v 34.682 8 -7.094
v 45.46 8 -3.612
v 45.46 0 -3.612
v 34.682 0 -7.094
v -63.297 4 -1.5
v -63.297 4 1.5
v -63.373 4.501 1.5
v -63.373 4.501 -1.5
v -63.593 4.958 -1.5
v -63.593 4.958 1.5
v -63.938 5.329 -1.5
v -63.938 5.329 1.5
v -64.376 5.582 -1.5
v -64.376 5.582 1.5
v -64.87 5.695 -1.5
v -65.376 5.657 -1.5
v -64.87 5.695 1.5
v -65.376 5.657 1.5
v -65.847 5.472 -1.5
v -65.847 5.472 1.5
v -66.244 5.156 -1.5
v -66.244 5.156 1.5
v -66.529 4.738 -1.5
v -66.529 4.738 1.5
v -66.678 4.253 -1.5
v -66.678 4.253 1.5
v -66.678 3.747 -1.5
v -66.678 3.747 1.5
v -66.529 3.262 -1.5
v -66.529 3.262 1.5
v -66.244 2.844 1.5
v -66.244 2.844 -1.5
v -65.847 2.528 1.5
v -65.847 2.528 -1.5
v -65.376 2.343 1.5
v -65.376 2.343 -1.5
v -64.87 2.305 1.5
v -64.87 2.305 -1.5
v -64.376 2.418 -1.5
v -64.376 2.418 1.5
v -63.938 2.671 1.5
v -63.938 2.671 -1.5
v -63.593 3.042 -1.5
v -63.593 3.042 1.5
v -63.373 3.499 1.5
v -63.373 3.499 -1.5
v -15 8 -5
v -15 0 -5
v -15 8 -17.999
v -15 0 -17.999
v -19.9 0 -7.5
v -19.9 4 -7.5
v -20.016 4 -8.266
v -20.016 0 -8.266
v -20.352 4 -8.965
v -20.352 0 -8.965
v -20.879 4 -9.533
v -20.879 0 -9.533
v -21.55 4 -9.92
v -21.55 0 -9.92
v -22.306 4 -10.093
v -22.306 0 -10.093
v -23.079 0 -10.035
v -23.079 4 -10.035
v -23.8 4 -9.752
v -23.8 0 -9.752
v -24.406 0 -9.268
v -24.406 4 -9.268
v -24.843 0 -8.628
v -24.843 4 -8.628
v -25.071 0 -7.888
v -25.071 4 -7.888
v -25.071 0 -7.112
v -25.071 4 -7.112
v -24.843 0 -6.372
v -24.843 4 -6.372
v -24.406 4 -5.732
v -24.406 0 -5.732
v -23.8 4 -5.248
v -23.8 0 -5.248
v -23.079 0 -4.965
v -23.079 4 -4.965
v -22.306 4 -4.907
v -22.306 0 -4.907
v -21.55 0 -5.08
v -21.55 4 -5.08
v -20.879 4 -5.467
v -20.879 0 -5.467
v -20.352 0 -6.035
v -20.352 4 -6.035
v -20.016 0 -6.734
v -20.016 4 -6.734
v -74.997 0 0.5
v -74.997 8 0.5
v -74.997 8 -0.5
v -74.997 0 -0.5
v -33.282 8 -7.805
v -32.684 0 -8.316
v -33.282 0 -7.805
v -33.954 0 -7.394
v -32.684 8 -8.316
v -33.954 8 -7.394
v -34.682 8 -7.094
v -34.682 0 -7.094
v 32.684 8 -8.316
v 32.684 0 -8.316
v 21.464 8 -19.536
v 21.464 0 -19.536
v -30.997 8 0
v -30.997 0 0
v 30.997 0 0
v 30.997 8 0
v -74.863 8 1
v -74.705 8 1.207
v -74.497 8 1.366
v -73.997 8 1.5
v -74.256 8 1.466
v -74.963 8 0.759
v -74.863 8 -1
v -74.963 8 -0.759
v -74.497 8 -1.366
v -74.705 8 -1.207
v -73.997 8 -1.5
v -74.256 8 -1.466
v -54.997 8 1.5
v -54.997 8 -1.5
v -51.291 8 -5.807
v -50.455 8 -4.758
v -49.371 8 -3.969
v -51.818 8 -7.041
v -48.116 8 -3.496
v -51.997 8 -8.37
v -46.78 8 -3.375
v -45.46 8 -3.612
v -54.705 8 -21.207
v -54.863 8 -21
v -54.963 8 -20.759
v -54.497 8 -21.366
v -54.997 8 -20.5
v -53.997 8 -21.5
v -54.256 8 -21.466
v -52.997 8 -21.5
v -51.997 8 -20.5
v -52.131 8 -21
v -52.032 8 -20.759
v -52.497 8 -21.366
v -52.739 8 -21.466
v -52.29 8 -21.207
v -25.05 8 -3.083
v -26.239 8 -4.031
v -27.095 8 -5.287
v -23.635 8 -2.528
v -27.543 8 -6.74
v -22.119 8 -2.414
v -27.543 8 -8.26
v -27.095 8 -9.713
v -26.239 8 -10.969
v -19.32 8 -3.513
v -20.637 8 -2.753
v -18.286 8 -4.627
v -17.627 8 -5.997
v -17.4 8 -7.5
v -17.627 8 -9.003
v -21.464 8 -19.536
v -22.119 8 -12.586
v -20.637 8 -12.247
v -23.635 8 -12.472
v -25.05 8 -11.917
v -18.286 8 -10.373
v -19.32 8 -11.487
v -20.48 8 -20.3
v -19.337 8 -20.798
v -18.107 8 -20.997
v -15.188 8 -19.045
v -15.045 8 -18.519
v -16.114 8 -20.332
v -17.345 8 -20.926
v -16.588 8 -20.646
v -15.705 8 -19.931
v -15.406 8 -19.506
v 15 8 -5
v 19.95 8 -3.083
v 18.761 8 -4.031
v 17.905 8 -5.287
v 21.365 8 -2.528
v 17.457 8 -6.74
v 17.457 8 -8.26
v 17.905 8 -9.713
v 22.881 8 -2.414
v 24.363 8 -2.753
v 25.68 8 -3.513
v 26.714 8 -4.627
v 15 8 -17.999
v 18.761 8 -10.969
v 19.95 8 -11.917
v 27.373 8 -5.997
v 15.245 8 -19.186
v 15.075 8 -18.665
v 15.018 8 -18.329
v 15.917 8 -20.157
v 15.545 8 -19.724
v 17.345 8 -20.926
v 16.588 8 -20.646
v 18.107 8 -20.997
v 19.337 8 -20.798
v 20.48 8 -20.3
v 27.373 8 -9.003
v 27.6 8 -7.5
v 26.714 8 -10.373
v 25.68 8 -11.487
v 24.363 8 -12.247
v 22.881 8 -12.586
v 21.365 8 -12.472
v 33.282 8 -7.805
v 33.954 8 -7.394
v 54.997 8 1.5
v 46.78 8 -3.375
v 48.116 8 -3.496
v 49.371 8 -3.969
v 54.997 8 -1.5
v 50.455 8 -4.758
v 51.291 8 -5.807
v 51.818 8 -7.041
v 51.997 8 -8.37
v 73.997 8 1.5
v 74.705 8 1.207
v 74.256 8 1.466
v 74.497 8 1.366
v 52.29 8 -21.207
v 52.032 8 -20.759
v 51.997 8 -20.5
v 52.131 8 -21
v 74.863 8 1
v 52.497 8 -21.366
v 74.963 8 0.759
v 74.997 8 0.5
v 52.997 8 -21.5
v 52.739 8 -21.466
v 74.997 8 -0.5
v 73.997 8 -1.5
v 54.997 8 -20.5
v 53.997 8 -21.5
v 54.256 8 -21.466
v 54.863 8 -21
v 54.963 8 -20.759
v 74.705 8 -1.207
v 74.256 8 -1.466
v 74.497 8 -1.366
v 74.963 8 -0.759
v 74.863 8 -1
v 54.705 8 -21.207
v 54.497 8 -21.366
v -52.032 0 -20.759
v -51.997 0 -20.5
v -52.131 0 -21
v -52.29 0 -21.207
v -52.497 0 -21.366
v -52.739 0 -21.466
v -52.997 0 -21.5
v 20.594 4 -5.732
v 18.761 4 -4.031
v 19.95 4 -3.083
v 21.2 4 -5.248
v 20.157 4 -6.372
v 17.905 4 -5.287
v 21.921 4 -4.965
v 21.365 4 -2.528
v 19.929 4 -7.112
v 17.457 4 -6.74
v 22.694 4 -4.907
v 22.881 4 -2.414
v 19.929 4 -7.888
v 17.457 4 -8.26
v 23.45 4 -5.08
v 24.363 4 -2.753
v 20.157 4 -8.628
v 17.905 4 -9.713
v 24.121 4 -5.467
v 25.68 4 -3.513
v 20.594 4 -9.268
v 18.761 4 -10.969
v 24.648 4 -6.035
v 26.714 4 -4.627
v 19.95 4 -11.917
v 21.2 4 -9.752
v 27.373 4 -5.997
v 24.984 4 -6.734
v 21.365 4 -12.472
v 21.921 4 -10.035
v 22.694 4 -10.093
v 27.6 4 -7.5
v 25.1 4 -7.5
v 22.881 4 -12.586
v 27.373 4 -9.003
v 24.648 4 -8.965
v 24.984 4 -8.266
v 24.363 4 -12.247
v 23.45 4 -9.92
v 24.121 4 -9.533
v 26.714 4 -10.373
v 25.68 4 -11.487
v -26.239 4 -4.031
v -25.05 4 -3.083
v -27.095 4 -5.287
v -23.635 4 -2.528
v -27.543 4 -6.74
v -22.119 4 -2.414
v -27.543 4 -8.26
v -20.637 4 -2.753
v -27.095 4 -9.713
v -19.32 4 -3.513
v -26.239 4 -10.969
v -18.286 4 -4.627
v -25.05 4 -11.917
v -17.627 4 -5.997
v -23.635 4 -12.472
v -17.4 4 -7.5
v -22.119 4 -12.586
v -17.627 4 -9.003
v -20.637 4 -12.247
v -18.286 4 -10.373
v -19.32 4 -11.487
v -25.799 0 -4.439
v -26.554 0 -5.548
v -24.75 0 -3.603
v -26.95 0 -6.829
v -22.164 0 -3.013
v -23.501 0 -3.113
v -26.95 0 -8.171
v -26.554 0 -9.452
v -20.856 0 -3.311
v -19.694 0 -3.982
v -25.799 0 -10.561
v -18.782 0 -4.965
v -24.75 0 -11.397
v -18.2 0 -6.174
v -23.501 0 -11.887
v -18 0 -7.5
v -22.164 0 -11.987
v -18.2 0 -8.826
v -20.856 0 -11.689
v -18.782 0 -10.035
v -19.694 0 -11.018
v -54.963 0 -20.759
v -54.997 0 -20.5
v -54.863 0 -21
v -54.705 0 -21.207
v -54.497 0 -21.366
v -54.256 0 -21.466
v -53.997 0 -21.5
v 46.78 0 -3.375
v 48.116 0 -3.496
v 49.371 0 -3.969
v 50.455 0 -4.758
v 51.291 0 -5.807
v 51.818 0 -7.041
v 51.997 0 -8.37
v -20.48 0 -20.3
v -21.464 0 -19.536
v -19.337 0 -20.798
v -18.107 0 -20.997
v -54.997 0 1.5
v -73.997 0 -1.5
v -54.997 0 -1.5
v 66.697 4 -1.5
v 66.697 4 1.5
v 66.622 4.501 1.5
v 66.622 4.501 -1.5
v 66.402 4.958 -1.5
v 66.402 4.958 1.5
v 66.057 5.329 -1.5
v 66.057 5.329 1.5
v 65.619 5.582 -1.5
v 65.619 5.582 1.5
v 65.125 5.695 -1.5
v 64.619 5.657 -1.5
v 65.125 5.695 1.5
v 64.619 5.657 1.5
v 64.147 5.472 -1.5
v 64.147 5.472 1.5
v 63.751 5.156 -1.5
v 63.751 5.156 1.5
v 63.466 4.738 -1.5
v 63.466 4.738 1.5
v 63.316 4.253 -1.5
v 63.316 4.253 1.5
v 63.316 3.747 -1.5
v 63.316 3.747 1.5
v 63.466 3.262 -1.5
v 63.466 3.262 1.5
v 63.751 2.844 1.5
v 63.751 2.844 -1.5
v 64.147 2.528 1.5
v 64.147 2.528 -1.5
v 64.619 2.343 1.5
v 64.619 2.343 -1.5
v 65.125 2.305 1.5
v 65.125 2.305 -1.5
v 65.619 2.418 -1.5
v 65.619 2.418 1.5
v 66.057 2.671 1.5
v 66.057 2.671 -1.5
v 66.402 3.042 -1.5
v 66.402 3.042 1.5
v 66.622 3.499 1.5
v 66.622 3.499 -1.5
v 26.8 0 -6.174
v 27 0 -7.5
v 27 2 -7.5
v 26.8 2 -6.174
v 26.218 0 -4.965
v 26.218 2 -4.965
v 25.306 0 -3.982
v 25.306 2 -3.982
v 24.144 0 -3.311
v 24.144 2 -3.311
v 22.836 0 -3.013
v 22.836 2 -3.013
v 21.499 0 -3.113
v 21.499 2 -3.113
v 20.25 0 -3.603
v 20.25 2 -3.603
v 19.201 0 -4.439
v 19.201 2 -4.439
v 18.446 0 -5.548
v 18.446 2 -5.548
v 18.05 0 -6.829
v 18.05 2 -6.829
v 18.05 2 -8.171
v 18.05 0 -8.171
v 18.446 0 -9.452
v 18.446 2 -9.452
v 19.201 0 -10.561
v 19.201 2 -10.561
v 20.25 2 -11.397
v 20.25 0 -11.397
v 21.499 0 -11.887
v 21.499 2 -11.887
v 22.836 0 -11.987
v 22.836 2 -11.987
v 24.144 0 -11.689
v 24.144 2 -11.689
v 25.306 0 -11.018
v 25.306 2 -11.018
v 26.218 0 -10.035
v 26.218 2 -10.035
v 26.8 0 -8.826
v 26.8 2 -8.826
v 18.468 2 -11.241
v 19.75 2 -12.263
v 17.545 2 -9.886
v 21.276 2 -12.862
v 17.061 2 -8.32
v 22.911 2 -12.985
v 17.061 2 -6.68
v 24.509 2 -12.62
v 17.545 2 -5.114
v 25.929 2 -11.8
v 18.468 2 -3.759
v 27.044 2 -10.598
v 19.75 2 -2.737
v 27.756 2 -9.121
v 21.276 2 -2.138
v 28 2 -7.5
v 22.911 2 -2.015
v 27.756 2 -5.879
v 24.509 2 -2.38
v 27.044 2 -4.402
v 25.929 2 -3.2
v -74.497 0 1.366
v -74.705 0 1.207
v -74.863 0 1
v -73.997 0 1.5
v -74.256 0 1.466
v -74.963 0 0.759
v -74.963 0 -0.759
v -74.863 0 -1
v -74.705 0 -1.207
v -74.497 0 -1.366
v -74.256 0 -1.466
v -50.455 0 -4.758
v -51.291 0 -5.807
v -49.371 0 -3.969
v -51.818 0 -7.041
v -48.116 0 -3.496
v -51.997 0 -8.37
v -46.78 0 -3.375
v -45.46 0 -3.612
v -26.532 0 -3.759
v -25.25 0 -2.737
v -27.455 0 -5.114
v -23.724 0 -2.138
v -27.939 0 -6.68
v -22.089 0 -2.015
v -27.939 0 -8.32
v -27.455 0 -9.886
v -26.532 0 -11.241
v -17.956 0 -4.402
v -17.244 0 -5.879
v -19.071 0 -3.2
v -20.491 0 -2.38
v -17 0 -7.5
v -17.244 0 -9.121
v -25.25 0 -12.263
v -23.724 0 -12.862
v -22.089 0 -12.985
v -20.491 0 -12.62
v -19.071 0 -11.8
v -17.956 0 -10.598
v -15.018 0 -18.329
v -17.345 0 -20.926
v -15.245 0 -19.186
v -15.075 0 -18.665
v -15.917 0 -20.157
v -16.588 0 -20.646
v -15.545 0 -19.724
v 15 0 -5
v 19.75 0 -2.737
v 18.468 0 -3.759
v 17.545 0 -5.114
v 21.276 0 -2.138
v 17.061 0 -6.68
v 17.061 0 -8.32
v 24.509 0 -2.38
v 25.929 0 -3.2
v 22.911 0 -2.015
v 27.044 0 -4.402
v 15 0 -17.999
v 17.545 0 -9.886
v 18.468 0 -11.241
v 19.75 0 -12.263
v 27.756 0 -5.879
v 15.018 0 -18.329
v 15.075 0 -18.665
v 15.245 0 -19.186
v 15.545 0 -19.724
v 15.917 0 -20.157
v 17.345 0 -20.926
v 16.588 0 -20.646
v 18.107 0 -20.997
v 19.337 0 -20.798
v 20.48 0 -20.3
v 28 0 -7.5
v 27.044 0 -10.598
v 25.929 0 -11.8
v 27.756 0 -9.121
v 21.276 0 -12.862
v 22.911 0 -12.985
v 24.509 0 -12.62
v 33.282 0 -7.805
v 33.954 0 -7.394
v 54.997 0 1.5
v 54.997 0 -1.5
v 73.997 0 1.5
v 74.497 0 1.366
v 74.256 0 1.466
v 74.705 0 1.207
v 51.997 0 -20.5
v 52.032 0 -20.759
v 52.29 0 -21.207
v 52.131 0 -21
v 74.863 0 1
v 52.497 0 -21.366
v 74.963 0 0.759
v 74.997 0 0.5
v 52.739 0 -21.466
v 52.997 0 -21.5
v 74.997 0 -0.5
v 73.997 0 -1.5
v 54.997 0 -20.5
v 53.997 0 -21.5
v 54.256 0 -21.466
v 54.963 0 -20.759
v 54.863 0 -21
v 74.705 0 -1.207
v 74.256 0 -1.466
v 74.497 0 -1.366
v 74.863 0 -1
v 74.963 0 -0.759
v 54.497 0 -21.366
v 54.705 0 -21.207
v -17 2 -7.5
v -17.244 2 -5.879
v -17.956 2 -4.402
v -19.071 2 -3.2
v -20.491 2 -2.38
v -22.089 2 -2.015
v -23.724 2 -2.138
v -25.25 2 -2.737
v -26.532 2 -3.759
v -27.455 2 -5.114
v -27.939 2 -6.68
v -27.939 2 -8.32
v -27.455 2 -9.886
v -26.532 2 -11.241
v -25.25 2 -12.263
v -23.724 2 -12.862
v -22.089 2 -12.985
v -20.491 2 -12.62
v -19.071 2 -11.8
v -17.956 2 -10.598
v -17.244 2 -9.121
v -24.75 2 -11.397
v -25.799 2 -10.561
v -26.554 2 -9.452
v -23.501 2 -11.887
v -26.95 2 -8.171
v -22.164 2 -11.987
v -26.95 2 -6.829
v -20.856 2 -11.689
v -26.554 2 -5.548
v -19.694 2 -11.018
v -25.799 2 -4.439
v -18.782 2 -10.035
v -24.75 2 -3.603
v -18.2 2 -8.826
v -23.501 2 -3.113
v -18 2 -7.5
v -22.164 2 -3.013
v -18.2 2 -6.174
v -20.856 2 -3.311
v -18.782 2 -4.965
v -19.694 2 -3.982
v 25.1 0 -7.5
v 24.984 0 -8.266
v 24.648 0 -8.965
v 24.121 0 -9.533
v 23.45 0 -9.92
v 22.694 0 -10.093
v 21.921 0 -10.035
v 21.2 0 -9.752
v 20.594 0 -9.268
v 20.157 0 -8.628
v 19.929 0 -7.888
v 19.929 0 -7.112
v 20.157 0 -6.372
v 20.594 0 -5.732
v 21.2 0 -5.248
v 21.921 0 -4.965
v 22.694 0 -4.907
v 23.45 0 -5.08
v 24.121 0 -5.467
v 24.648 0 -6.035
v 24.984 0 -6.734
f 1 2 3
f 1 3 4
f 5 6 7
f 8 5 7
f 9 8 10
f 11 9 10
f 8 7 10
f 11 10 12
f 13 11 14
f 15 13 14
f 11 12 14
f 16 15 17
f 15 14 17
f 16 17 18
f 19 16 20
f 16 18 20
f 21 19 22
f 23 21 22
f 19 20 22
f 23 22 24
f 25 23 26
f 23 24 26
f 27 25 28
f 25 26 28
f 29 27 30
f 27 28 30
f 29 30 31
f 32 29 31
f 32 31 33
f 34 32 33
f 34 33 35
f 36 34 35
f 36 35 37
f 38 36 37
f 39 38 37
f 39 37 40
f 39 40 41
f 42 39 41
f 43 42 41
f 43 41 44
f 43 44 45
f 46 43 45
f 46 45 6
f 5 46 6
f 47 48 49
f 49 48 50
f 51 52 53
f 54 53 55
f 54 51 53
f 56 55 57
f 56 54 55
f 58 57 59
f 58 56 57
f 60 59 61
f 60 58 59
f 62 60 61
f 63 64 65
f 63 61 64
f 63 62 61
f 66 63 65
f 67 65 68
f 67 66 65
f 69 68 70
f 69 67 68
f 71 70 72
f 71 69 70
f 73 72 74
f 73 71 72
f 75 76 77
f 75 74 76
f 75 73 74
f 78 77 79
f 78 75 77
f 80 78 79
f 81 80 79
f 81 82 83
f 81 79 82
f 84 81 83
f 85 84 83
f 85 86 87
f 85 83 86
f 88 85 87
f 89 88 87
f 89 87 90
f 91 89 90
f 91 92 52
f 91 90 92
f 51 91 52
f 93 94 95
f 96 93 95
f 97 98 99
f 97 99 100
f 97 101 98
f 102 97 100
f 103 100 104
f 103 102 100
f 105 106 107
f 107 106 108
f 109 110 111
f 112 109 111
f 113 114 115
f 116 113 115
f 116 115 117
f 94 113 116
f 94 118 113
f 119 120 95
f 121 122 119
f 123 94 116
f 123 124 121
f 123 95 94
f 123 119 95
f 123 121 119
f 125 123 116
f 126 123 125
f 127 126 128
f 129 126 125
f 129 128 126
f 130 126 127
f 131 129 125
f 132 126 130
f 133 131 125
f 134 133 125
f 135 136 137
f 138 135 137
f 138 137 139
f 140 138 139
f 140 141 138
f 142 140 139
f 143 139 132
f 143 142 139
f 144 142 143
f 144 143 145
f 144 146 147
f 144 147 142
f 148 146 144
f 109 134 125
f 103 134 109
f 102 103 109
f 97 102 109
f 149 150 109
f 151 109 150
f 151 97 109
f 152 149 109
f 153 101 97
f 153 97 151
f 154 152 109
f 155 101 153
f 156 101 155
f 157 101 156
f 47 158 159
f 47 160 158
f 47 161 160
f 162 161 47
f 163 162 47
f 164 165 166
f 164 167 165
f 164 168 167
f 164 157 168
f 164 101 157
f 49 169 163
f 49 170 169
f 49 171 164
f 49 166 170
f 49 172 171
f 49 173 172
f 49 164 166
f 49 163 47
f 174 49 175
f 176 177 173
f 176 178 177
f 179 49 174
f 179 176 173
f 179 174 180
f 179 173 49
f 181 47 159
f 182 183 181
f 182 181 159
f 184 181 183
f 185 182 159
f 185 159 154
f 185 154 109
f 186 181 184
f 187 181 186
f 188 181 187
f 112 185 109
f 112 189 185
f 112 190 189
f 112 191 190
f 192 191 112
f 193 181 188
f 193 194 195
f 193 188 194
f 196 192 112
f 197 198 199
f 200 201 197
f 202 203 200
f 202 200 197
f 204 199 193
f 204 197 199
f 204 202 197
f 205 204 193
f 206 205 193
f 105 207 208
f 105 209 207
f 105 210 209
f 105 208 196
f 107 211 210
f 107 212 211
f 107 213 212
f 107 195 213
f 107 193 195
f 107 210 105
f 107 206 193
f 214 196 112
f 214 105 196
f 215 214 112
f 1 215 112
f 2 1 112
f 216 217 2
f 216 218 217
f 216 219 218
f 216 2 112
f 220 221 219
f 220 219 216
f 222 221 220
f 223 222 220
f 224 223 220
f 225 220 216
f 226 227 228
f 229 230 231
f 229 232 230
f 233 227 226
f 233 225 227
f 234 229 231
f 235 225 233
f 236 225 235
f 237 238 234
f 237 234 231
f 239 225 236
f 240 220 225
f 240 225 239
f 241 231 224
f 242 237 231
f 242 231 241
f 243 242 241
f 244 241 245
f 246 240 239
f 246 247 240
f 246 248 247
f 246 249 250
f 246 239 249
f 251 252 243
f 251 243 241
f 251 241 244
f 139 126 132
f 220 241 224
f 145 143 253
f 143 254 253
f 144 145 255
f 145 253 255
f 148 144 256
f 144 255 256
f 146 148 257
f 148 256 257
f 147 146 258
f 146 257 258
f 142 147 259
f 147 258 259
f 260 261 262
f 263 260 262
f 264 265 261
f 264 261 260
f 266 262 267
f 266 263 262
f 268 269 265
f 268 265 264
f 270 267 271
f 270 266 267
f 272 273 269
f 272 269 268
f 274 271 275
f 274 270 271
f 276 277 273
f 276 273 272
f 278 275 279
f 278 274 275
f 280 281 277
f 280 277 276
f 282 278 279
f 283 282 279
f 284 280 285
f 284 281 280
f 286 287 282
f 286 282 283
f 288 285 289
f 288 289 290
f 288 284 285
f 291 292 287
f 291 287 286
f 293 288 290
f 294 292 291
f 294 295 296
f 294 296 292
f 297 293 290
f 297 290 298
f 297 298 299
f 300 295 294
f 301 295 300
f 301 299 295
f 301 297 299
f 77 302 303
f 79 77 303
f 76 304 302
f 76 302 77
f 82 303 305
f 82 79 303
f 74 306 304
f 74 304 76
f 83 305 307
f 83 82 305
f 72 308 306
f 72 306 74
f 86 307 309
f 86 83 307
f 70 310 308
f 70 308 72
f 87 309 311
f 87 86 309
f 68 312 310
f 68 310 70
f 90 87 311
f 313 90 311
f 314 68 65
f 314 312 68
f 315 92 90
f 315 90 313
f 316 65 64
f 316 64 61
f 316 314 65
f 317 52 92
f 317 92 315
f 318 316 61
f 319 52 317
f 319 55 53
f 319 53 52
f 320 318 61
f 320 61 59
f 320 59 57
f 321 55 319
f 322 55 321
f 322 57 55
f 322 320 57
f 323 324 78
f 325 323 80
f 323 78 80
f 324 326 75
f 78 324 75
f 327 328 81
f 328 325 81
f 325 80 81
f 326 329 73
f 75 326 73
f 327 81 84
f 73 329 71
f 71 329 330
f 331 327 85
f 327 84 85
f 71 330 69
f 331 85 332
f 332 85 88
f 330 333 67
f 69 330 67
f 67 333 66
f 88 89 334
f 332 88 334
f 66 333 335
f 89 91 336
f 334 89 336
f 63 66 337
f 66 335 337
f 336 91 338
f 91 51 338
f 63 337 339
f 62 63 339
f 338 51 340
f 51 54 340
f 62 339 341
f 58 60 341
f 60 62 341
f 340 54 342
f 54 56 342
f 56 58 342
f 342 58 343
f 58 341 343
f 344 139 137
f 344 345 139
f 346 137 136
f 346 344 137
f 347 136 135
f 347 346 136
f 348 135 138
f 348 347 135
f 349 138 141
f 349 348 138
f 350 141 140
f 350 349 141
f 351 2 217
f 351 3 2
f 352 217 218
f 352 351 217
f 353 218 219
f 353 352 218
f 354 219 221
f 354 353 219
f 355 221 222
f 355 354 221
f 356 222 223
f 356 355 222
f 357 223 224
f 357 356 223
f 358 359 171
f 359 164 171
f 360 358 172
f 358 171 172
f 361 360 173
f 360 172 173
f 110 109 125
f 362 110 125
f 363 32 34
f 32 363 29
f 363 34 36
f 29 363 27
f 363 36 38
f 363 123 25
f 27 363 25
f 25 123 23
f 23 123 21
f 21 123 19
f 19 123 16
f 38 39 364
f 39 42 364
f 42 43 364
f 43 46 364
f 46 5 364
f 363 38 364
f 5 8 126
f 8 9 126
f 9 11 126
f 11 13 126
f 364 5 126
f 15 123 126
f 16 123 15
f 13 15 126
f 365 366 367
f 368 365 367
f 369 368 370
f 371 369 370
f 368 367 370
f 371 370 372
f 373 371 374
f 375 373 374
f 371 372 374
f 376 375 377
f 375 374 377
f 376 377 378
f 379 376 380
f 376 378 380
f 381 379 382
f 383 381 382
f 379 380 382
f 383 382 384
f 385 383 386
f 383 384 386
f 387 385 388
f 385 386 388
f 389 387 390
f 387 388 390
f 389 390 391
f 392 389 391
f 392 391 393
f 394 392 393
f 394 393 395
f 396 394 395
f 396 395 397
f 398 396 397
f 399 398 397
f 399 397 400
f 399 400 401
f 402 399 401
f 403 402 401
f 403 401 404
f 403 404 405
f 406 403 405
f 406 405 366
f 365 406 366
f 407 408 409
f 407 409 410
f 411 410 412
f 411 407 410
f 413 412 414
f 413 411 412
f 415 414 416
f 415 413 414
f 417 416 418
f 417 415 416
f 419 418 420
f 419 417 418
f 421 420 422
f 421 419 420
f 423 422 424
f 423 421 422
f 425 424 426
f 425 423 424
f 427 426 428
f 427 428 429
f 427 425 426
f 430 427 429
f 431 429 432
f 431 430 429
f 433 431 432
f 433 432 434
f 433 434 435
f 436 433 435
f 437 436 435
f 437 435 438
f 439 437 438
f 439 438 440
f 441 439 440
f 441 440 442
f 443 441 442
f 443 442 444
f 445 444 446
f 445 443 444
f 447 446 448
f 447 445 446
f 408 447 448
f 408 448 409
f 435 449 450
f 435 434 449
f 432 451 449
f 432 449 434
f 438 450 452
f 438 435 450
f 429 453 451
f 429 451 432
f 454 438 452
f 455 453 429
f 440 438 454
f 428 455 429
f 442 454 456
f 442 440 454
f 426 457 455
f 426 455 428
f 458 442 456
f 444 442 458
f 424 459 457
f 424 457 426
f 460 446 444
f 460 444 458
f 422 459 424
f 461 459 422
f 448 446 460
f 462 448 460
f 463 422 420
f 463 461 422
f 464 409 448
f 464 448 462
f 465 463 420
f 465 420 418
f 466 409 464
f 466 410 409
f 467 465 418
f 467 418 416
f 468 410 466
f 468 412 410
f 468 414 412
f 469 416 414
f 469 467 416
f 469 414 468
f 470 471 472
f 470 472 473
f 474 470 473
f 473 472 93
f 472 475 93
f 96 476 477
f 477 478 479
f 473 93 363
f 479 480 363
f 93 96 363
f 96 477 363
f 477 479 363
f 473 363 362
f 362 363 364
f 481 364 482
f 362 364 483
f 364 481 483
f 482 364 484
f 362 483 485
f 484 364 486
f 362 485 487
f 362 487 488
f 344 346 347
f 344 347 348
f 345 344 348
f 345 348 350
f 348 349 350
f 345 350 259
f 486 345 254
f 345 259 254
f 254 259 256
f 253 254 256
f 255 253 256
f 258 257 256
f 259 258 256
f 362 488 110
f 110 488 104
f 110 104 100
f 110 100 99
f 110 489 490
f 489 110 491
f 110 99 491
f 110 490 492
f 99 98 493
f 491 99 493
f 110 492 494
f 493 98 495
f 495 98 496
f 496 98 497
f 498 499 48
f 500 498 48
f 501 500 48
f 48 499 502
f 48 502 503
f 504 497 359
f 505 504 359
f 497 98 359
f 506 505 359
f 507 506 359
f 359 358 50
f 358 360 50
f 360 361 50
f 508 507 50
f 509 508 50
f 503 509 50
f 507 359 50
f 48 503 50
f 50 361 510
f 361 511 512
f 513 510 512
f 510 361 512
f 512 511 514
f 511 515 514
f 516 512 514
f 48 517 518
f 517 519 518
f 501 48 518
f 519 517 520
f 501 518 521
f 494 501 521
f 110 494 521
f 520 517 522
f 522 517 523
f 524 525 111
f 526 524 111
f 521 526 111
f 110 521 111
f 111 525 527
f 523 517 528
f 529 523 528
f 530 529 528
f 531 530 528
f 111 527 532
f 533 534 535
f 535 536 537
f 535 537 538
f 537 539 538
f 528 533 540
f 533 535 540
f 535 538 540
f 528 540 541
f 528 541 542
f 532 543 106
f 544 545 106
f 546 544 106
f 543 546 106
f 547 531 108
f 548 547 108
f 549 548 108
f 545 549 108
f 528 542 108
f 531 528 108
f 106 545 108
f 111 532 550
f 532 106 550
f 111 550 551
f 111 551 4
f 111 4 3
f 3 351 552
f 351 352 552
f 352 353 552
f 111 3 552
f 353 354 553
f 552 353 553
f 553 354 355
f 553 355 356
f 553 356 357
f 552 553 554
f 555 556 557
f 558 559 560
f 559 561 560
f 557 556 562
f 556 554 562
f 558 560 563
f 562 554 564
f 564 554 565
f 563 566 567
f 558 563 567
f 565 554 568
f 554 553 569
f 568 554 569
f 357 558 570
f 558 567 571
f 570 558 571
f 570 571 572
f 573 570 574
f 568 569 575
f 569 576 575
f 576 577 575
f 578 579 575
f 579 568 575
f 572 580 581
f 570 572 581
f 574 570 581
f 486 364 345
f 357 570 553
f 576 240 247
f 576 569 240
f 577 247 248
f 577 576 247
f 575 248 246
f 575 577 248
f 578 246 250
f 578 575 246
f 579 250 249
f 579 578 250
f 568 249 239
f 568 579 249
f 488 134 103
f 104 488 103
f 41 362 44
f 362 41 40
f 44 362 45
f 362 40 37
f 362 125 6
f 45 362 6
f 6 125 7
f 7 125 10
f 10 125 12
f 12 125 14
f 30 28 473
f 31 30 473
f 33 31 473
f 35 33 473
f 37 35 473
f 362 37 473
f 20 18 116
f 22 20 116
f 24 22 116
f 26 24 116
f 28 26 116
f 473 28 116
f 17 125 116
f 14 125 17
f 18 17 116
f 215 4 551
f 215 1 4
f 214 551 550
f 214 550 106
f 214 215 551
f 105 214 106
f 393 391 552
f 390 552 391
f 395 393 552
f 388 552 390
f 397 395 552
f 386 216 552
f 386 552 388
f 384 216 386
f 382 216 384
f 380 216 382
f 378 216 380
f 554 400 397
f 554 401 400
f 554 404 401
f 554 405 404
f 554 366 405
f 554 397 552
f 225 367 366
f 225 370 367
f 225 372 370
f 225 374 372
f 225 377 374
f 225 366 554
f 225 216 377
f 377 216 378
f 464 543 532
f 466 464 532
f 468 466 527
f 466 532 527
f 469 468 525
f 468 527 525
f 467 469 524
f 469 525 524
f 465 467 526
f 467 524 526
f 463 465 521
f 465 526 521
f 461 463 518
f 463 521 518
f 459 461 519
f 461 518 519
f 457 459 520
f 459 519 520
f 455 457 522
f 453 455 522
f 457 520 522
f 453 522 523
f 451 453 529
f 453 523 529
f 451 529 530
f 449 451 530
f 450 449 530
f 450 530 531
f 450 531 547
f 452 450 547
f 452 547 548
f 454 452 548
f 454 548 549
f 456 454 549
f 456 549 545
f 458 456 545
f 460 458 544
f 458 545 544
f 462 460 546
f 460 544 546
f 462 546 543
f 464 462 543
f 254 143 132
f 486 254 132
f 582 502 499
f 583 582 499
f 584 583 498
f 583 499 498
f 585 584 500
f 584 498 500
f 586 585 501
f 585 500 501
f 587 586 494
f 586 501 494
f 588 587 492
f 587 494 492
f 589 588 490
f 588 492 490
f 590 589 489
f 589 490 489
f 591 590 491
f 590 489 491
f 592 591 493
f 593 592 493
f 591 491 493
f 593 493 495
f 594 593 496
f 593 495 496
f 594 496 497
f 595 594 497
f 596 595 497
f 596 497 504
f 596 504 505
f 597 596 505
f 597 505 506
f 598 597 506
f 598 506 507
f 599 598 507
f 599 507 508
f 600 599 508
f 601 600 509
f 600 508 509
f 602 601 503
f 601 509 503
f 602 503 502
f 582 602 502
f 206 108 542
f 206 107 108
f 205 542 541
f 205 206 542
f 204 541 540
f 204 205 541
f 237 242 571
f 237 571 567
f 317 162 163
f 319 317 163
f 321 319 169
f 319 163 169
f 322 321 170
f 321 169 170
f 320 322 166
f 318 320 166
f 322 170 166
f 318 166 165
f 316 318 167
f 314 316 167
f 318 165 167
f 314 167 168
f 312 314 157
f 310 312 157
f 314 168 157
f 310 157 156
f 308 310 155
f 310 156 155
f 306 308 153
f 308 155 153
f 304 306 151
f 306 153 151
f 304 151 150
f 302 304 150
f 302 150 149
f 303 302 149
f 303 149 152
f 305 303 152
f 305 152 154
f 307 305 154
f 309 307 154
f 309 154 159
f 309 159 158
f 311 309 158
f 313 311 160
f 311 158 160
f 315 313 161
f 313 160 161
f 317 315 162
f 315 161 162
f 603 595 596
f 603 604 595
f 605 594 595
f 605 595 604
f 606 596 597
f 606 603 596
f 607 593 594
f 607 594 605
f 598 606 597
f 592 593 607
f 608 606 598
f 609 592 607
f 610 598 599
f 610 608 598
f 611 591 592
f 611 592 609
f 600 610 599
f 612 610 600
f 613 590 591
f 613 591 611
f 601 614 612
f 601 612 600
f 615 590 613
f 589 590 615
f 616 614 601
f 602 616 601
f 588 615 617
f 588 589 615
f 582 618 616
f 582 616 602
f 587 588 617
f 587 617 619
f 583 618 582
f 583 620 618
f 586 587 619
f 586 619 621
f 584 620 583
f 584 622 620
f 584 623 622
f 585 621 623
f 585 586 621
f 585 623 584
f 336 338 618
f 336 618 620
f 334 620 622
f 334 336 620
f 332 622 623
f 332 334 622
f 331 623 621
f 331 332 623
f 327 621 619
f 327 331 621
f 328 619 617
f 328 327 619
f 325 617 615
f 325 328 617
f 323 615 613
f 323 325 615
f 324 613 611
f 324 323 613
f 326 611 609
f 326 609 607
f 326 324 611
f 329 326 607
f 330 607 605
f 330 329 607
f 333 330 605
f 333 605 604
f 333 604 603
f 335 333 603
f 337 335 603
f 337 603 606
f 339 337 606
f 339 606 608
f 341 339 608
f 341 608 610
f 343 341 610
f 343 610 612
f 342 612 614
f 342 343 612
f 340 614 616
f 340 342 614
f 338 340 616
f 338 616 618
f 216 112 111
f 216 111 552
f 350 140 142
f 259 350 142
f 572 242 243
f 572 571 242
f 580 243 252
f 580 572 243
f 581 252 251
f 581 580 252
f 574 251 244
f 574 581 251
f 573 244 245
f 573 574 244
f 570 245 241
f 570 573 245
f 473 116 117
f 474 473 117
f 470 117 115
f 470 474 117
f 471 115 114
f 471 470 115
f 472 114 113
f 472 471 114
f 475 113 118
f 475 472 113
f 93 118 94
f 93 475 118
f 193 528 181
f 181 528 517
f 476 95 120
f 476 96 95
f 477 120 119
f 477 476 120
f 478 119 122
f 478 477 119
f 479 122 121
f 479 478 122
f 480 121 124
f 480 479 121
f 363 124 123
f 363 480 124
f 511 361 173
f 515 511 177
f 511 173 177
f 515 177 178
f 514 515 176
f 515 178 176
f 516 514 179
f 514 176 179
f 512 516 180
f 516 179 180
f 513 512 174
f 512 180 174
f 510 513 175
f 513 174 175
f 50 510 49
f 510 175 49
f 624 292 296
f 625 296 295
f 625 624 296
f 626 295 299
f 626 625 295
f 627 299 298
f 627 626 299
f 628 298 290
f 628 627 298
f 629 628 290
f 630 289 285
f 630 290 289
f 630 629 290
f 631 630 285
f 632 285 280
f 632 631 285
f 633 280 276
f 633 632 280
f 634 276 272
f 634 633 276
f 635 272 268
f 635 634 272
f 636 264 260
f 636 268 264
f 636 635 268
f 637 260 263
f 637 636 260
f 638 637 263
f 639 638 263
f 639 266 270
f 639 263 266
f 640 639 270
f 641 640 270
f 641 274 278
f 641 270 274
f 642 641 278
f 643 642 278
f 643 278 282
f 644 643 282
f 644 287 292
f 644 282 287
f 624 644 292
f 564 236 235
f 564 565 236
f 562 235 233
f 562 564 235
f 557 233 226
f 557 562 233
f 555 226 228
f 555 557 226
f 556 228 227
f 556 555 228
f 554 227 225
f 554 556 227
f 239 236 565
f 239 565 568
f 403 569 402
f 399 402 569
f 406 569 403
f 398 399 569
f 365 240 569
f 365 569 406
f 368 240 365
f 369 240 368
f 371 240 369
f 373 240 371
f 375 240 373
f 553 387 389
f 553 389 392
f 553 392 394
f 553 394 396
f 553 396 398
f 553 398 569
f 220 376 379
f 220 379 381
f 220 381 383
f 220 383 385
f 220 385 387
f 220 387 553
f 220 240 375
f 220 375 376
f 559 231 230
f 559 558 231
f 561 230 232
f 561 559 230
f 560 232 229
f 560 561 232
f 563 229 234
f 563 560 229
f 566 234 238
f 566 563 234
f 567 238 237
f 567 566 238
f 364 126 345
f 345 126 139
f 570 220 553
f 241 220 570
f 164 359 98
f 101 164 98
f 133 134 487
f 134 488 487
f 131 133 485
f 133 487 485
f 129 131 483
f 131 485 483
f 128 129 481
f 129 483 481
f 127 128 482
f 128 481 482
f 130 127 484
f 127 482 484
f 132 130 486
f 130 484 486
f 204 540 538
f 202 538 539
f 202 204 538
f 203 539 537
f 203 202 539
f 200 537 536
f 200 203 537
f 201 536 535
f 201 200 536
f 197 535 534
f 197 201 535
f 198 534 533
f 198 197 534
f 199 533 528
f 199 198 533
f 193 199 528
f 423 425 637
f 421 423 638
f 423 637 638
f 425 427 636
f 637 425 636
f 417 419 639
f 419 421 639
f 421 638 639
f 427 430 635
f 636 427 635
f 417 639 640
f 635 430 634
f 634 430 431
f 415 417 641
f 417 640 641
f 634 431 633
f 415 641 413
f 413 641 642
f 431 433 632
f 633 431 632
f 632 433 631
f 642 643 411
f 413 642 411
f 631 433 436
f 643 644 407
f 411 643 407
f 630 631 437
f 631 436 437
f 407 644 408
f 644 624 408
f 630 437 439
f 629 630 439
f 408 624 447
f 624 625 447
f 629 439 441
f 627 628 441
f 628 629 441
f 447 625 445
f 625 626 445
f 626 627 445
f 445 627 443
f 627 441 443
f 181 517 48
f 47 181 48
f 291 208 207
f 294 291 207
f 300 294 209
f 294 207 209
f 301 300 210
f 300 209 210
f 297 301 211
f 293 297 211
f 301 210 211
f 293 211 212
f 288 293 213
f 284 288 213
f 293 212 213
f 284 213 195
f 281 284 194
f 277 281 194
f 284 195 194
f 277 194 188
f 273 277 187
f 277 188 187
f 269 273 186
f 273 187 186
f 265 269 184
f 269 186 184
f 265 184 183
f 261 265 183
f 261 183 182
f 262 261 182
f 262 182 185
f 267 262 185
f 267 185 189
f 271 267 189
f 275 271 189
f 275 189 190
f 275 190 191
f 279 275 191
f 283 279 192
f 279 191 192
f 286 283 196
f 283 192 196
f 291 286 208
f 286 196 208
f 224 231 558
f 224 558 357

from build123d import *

# Parameters (mm, degrees)
ESQUISSE1_R             = 2.6
BOSS_EXTRU_1_DEPTH      = 8
ESQUISSE3_R             = 5.1
ENL_V_MAT_EXTRU_2_DEPTH = 4
ESQUISSE4_R             = 5.5
ESQUISSE4_R_2           = 4.5
ENL_V_MAT_EXTRU_3_DEPTH = 2
CONG_1_R                = 5
CONG_2_R                = 3
CONG_3_R                = 4
BOSS_EXTRU_2_DEPTH      = 8
CONG_4_R                = 5
ENL_V_MAT_EXTRU_4_REACH = 25
ESQUISSE6_R             = 1.7
CONG_5_R                = 1


with BuildPart() as part:
    # Esquisse1 → Boss.-Extru.1 (new body)
    with BuildSketch(Plane(origin=(0, 0, 0), x_dir=(1, 0, 0), z_dir=(0, 1, 0))):
        Polygon((-35, 0), (35, 0), (35, 6), (20, 21), (15, 21), (15, 5), (-15, 5), (-15, 21), (-20, 21), (-35, 6), align=None)
        with Locations((22.5, 7.5)):
            Circle(ESQUISSE1_R, mode=Mode.SUBTRACT)
        with Locations((-22.5, 7.5)):
            Circle(ESQUISSE1_R, mode=Mode.SUBTRACT)
    extrude(amount=BOSS_EXTRU_1_DEPTH)

    # Esquisse3 → Enlèv. mat.-Extru.2 (cut)
    with BuildSketch(Plane(origin=(0, 8, 0), x_dir=(1, 0, 0), z_dir=(0, 1, 0))):
        with Locations((-22.5, 7.5)):
            Circle(ESQUISSE3_R)
        with Locations((22.5, 7.5)):
            Circle(ESQUISSE3_R)
    extrude(amount=-ENL_V_MAT_EXTRU_2_DEPTH, mode=Mode.SUBTRACT)

    # Esquisse4 → Enlèv. mat.-Extru.3 (cut)
    with BuildSketch(Plane.XZ):
        with Locations((-22.5, -7.5)):
            Circle(ESQUISSE4_R)
        with Locations((-22.5, -7.5)):
            Circle(ESQUISSE4_R_2, mode=Mode.SUBTRACT)
        with Locations((22.5, -7.5)):
            Circle(ESQUISSE4_R)
        with Locations((22.5, -7.5)):
            Circle(ESQUISSE4_R_2, mode=Mode.SUBTRACT)
    extrude(amount=-ENL_V_MAT_EXTRU_3_DEPTH, mode=Mode.SUBTRACT)

    # Congé1
    cong_1_edges = [part.edges().sort_by_distance(p)[0] for p in [
        (-35, 4, -6),
        (-20, 4, -21),
        (20, 4, -21),
        (35, 4, -6),
    ]]
    fillet(cong_1_edges, radius=CONG_1_R)

    # Congé2
    cong_2_edges = [part.edges().sort_by_distance(p)[0] for p in [
        (-15, 4, -21),
        (15, 4, -21),
    ]]
    fillet(cong_2_edges, radius=CONG_2_R)

    # Congé3
    cong_3_edges = [part.edges().sort_by_distance(p)[0] for p in [
        (-35, 4, 0),
        (35, 4, 0),
    ]]
    fillet(cong_3_edges, radius=CONG_3_R)

    # Esquisse5 → Boss.-Extru.2 (add)
    with BuildSketch(Plane(origin=(0, 8, 0), x_dir=(1, 0, 0), z_dir=(0, 1, 0))):
        Polygon((30.997471486, 0), (54.997471486, -1.5), (74.997471486, -1.5), (74.997471486, 1.5), (54.997471486, 1.5), (54.997471486, 21.5), (51.997471486, 21.5), (51.997471486, 1.5), (33.535533906, 7.464466094), align=None)
        Polygon((-33.535533906, 7.464466094), (-30.997471486, 0), (-54.997471486, -1.5), (-74.997471486, -1.5), (-74.997471486, 1.5), (-54.997471486, 1.5), (-54.997471486, 21.5), (-51.997471486, 21.5), (-51.997471486, 1.5), align=None)
    extrude(amount=-BOSS_EXTRU_2_DEPTH)

    # Congé4
    cong_4_edges = [part.edges().sort_by_distance(p)[0] for p in [
        (51.997471486, 4, -1.5),
        (-51.997471486, 4, -1.5),
        (-33.535533906, 4, -7.464466094),
        (33.535533906, 4, -7.464466094),
    ]]
    fillet(cong_4_edges, radius=CONG_4_R)

    # Esquisse6 → Enlèv. mat.-Extru.4 (cut, up to next)
    with BuildSketch(Plane.XY.offset(1.5), mode=Mode.PRIVATE) as enl_v_mat_extru_4_sk1:
        with Locations((64.997471486, 4)):
            Circle(ESQUISSE6_R)
    enl_v_mat_extru_4_tool1 = extrude(enl_v_mat_extru_4_sk1.sketch, amount=-ENL_V_MAT_EXTRU_4_REACH, mode=Mode.PRIVATE) & part.part
    add(enl_v_mat_extru_4_tool1.solids().sort_by_distance((64.997471, 4, 1.5))[0], mode=Mode.SUBTRACT)
    # Esquisse6 → Enlèv. mat.-Extru.4 (cut, up to next)
    with BuildSketch(Plane.XY.offset(1.5), mode=Mode.PRIVATE) as enl_v_mat_extru_4_sk2:
        with Locations((-64.997471486, 4)):
            Circle(ESQUISSE6_R)
    enl_v_mat_extru_4_tool2 = extrude(enl_v_mat_extru_4_sk2.sketch, amount=-ENL_V_MAT_EXTRU_4_REACH, mode=Mode.PRIVATE) & part.part
    add(enl_v_mat_extru_4_tool2.solids().sort_by_distance((-64.997471, 4, 1.5))[0], mode=Mode.SUBTRACT)

    # Congé5
    cong_5_edges = [part.edges().sort_by_distance(p)[0] for p in [
        (51.997471486, 4, -21.5),
        (54.997471486, 4, -21.5),
        (74.997471486, 4, -1.5),
        (74.997471486, 4, 1.5),
        (-74.997471486, 4, 1.5),
        (-74.997471486, 4, -1.5),
        (-54.997471486, 4, -21.5),
        (-51.997471486, 4, -21.5),
    ]]
    fillet(cong_5_edges, radius=CONG_5_R)


solid = part.part
